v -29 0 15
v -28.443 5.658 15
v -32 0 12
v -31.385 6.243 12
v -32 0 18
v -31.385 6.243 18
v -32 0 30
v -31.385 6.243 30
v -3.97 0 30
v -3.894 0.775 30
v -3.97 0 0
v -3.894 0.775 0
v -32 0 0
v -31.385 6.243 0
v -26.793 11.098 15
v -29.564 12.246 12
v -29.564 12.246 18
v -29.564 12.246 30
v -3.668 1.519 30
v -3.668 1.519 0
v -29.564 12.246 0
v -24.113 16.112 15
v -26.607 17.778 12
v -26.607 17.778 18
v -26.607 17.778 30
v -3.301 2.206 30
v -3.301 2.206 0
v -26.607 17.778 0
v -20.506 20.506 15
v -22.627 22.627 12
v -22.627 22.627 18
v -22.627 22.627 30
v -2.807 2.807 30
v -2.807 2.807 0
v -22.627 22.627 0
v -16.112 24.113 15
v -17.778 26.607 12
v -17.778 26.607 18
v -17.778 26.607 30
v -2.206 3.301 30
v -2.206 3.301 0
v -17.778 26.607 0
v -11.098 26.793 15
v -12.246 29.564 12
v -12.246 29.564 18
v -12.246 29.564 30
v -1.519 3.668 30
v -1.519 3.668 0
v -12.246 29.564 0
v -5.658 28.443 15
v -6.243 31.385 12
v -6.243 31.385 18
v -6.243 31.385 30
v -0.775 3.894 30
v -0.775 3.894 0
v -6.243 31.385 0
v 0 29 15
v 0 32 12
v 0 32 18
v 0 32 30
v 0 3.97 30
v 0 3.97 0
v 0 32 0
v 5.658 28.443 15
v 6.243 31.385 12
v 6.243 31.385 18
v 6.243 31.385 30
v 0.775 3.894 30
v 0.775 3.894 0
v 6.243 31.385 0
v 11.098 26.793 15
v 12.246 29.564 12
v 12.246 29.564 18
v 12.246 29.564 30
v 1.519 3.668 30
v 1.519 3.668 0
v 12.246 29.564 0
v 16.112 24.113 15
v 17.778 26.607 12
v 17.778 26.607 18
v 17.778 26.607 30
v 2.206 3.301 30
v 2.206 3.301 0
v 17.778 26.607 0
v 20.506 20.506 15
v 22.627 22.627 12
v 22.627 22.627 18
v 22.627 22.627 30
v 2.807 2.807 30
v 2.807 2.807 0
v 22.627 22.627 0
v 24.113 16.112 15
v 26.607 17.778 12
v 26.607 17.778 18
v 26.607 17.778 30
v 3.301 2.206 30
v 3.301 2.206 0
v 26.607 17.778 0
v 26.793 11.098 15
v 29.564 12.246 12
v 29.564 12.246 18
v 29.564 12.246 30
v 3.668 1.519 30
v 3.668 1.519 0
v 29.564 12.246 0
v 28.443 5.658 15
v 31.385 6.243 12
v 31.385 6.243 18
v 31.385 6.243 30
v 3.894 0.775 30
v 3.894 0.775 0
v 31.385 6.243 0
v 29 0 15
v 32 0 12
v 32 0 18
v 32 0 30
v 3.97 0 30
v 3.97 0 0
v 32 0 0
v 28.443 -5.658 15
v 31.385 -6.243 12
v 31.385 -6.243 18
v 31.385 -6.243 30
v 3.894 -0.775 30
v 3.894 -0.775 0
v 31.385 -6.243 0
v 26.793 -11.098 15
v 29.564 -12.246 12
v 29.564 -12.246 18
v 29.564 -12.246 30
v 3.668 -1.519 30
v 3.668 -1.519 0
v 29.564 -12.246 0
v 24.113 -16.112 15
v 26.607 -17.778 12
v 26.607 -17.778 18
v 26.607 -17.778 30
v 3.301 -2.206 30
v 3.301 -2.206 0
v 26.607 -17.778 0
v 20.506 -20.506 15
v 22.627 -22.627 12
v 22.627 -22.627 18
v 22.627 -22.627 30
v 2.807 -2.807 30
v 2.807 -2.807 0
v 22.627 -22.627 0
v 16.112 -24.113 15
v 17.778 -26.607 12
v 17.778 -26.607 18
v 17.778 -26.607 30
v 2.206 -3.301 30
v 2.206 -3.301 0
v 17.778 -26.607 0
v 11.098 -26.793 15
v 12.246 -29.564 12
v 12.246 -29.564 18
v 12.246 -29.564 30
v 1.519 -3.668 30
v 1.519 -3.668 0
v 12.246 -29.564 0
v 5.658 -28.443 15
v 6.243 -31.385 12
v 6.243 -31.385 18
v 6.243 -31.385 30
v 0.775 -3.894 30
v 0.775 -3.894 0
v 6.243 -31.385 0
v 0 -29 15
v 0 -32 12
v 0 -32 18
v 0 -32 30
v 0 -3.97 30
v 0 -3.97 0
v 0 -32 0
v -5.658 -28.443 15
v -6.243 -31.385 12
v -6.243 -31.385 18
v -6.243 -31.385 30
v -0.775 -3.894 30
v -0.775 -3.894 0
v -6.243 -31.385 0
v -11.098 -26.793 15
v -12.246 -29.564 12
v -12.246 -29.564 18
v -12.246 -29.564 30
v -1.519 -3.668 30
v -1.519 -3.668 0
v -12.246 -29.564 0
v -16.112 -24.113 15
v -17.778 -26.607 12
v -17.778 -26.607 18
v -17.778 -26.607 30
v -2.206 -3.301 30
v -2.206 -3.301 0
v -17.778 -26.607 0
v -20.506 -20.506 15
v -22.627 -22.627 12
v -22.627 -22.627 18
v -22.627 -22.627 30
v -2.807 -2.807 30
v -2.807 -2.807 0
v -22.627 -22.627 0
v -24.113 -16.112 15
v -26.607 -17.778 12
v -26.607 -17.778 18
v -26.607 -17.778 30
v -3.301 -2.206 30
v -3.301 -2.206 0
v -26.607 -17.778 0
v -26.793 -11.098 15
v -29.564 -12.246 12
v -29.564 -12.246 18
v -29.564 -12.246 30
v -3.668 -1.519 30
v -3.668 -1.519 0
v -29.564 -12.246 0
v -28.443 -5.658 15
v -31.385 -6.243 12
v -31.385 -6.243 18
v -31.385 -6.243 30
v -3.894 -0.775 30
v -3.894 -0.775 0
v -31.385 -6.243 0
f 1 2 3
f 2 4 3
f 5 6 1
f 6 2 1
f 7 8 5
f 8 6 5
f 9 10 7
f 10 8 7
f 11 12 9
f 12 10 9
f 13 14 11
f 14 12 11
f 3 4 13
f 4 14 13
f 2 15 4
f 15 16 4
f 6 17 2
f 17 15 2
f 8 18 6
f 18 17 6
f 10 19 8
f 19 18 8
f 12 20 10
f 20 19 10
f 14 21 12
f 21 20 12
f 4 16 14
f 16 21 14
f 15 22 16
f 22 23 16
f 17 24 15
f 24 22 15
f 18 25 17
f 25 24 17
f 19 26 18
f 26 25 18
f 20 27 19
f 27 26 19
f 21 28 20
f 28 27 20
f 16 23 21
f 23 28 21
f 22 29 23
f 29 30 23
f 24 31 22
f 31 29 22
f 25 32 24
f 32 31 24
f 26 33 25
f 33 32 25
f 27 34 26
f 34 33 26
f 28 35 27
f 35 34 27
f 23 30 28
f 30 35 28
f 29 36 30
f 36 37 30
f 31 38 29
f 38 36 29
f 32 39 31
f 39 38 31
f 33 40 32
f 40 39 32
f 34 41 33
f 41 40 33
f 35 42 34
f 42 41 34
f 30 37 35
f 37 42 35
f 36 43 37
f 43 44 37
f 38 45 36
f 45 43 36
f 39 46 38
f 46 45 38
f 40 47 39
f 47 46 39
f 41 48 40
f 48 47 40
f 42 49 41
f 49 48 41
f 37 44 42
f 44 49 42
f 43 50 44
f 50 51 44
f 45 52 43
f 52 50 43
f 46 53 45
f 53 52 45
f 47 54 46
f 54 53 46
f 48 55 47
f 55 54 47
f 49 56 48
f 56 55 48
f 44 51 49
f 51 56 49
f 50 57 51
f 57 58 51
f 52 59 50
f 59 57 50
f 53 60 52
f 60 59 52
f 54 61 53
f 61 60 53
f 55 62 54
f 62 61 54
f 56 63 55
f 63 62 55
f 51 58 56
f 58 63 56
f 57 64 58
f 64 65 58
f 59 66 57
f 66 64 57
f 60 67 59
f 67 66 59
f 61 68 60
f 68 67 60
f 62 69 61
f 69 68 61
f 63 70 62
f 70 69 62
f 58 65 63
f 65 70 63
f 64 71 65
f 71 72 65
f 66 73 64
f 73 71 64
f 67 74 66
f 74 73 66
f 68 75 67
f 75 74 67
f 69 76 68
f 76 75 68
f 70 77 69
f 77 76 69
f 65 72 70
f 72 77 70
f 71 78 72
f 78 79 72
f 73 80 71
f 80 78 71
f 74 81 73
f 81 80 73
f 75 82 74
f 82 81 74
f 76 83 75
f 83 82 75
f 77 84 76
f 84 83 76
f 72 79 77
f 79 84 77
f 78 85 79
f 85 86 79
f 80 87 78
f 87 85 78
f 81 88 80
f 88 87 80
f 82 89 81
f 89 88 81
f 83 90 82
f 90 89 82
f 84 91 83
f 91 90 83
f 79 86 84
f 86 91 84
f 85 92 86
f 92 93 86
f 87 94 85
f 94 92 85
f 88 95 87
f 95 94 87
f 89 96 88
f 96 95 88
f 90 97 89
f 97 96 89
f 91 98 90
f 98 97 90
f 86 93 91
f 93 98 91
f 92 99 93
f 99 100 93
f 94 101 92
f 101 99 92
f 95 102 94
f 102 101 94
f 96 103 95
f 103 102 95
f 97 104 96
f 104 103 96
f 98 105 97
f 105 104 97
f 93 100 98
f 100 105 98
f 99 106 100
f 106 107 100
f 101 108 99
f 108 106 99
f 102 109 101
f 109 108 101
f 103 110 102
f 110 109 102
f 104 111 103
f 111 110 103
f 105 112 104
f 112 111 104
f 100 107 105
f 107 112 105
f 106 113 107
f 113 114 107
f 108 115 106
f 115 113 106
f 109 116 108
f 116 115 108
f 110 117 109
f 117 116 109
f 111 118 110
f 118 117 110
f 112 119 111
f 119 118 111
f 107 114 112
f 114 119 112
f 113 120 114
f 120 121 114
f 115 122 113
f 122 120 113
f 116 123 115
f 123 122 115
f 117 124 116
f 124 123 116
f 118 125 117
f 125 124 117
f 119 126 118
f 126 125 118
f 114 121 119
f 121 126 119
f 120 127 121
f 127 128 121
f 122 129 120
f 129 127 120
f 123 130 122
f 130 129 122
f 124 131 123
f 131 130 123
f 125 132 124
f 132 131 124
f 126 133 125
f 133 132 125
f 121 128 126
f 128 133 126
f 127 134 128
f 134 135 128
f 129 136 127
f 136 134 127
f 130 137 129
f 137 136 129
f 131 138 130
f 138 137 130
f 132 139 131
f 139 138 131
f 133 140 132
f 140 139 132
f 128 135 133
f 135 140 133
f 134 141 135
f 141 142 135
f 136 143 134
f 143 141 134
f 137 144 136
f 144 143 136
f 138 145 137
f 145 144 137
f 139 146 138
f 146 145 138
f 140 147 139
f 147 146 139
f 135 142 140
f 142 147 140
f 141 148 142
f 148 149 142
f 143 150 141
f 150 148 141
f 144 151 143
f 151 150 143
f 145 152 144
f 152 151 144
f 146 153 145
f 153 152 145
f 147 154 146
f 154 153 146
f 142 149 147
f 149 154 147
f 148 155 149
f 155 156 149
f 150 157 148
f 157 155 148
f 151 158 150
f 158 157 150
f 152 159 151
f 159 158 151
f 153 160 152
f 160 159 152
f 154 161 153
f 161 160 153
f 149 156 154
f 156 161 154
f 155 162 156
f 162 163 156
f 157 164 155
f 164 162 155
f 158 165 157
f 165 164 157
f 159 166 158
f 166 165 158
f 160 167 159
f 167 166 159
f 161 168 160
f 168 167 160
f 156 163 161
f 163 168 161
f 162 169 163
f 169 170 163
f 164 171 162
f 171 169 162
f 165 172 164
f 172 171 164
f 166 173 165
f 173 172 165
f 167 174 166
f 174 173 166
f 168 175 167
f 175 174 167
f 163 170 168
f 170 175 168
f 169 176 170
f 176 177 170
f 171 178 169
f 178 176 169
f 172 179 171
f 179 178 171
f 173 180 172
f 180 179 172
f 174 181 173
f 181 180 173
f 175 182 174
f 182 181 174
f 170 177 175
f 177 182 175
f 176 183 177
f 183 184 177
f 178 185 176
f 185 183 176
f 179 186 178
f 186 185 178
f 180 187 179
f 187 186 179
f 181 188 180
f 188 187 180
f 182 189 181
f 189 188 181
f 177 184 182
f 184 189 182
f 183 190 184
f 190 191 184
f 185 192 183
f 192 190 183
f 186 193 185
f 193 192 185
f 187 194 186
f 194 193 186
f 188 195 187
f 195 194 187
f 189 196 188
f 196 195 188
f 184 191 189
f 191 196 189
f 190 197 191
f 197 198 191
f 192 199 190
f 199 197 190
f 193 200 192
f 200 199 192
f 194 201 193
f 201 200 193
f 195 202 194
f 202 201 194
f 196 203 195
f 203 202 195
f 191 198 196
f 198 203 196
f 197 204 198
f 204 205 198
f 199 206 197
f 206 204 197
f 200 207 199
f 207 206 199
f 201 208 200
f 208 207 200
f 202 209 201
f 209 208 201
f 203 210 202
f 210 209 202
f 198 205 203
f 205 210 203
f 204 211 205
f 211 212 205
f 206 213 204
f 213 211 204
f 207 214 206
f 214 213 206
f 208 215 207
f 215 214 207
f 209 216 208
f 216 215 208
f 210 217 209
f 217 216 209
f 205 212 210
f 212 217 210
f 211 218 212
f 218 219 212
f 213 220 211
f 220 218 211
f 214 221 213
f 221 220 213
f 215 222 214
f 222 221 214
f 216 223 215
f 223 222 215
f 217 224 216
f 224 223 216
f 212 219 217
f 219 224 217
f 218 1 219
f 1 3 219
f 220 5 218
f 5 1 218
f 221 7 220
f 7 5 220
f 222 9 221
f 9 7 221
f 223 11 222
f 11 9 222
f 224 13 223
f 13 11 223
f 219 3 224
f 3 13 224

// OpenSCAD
$fn = 32;

// ----------------------------------------------------------------------
// Belt roller: 64 mm barrel, 30 mm wide, bore 7.94 mm
// ----------------------------------------------------------------------

// --- parameters (mm) ---
bore_d = 7.94;            // bore
barrel_d = 64;            // barrel diameter
roller_w = 30;            // roller width
groove_w = 6;             // guide groove width
groove_d = 3;             // guide groove depth

roller_profile = [[3.97, 0], [32, 0], [32, 12], [29, 15], [32, 18], [32, 30], [3.97, 30]];

/* the profile stays clear of the axis, so the bore comes out of the revolve */
rotate_extrude() polygon(roller_profile);
